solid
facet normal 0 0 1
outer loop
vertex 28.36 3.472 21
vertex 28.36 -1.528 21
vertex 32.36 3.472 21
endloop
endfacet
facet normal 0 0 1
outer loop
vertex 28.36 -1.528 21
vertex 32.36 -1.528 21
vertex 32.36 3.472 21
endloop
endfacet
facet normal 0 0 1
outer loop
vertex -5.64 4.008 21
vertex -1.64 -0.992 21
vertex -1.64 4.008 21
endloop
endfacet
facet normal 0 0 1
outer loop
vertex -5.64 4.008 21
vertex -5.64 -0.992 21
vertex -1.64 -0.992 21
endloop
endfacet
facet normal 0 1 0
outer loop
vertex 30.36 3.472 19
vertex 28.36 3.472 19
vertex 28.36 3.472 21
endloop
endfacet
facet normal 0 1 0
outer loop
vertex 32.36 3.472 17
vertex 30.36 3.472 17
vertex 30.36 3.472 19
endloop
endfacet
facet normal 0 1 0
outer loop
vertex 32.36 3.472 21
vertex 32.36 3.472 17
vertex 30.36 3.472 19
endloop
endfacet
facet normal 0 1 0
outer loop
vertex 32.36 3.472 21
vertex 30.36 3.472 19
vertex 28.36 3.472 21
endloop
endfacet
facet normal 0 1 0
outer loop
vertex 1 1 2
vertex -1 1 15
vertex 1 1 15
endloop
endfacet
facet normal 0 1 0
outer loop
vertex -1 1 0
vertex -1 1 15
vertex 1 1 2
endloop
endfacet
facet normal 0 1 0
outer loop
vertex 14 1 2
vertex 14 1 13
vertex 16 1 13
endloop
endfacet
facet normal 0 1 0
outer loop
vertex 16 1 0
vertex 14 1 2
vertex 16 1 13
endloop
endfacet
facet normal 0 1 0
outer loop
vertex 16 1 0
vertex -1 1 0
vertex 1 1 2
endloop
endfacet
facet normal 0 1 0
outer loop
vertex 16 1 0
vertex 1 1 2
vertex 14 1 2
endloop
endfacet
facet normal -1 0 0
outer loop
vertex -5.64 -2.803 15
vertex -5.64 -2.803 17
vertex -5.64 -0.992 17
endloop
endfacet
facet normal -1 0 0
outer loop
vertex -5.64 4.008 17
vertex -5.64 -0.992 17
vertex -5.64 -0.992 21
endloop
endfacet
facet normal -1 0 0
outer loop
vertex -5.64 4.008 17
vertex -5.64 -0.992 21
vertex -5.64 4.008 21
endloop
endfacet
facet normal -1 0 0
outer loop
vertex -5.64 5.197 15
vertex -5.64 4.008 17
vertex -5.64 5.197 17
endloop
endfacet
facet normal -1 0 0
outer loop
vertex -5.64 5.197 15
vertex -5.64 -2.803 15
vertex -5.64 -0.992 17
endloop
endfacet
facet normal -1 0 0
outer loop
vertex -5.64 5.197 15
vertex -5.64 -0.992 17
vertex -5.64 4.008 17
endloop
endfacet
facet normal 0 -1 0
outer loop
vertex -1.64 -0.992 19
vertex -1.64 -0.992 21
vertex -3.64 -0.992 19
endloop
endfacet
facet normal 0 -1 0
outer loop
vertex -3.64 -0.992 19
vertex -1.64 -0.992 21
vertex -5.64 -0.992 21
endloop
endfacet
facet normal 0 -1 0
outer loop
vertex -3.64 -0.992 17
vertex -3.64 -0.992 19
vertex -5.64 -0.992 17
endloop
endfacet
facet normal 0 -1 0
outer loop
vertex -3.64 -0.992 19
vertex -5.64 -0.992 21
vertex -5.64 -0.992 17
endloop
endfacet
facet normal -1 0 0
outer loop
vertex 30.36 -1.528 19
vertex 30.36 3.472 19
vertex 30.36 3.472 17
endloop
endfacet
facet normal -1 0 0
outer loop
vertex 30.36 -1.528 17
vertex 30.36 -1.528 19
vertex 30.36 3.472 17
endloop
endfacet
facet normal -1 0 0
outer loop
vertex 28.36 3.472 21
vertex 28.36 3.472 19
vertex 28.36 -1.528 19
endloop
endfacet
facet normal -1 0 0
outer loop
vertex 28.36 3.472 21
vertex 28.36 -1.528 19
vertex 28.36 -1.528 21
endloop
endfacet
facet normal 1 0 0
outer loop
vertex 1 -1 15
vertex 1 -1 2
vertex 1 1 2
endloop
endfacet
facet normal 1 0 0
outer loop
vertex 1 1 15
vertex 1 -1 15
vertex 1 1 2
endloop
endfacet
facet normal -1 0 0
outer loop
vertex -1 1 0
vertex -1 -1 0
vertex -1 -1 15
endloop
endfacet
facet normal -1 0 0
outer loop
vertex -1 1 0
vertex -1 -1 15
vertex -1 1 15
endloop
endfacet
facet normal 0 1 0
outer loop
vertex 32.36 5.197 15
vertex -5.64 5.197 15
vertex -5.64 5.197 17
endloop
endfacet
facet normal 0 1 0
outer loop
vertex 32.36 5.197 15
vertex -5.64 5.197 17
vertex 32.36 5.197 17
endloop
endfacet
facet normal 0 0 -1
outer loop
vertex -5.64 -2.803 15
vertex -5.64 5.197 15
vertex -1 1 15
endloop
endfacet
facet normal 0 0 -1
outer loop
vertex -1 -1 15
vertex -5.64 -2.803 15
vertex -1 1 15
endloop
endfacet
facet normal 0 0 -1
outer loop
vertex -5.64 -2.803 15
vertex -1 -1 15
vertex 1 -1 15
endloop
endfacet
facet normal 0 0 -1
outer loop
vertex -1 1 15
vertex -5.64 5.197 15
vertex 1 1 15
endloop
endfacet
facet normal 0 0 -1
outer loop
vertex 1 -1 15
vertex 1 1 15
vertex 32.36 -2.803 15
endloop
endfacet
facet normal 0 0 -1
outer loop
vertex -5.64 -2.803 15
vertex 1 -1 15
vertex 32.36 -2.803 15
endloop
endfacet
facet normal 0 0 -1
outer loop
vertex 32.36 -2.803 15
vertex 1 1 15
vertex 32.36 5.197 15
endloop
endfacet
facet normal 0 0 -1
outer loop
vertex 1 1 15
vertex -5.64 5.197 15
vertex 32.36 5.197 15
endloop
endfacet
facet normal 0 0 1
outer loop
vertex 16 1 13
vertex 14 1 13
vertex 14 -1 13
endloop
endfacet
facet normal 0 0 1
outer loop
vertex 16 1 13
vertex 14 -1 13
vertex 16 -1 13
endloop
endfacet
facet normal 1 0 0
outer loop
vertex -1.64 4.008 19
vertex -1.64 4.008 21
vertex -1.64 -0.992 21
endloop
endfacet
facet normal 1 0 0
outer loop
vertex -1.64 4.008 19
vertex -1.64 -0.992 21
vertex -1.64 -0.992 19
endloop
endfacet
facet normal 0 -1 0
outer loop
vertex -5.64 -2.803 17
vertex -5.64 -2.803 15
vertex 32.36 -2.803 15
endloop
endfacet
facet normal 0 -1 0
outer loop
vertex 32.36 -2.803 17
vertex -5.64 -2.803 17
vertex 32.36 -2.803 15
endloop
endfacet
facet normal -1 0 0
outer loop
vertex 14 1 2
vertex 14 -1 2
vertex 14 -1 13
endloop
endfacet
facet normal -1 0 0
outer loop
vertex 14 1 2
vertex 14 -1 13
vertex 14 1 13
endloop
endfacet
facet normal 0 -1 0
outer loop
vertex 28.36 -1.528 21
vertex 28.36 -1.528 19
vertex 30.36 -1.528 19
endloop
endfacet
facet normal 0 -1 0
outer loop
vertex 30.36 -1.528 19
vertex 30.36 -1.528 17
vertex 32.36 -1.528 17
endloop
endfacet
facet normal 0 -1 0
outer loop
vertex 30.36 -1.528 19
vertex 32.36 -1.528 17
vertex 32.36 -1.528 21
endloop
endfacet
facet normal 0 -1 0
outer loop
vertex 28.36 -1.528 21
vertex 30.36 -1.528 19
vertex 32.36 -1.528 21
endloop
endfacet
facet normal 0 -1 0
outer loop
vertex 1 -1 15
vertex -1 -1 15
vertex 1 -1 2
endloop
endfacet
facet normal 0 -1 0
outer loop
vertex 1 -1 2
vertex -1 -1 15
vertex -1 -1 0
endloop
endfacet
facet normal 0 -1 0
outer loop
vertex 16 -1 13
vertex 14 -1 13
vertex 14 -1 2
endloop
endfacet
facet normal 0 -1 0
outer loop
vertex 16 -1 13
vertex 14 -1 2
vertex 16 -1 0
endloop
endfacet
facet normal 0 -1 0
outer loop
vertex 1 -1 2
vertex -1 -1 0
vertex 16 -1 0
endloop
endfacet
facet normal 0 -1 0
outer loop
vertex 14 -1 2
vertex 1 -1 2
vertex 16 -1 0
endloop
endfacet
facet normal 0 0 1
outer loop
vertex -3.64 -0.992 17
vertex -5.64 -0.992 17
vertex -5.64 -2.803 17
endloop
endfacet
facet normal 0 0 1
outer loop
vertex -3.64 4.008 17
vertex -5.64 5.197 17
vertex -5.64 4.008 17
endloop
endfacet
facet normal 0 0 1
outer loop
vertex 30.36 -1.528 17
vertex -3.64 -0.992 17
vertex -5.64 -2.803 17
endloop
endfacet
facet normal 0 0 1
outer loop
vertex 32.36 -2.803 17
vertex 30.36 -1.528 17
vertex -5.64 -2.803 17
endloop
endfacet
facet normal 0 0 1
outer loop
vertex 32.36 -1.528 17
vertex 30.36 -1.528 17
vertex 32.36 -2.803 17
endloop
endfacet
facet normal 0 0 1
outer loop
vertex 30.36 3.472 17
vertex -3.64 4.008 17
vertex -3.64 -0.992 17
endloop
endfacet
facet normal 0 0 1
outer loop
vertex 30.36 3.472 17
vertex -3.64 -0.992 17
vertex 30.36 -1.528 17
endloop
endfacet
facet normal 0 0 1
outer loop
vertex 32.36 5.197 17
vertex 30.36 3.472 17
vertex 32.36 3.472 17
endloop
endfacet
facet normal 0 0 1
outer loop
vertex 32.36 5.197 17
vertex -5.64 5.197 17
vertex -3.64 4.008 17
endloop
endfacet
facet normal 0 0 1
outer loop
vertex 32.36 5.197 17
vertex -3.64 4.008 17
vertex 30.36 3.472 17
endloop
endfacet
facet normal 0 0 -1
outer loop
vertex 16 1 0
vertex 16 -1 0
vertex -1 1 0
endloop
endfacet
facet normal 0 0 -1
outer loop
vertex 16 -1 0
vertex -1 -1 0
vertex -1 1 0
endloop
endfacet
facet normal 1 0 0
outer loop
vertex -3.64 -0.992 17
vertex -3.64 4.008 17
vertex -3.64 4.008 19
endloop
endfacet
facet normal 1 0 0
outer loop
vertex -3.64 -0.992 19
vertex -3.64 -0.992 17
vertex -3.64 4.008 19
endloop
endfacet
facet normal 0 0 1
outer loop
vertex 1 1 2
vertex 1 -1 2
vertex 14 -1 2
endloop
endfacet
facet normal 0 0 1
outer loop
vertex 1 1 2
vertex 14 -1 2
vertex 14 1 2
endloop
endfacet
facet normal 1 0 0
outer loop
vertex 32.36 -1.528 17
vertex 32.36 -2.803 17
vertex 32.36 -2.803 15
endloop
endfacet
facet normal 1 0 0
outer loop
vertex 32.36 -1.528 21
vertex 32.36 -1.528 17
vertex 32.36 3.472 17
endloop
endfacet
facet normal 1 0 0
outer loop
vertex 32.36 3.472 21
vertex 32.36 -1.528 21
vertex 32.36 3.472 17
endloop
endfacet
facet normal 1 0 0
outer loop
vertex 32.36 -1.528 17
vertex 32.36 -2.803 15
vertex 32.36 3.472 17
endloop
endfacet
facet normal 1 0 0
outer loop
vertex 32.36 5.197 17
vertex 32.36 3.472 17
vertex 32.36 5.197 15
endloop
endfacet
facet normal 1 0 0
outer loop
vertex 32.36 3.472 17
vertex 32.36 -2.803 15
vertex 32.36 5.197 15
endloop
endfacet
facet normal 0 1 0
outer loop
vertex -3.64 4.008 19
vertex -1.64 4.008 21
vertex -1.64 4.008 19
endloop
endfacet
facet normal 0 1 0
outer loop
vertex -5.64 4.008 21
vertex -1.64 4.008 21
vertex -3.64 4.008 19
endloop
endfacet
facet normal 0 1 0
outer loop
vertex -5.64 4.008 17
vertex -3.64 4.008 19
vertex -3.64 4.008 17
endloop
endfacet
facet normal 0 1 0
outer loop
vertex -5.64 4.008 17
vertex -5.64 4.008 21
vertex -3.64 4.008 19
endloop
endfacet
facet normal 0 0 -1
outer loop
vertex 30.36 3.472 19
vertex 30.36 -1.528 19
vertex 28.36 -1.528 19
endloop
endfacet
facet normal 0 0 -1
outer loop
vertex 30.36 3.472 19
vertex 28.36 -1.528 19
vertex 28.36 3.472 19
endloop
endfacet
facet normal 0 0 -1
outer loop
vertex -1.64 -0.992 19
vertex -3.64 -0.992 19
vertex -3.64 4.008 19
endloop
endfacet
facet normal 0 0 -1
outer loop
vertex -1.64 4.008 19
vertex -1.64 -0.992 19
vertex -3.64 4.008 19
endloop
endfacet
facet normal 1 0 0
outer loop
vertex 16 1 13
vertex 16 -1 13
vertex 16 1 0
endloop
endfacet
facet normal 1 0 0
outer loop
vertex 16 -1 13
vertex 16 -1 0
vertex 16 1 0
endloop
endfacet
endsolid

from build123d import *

# Parameters (mm, degrees)
SKETCH1_W           = 2
SKETCH1_H           = 2
BOSS_EXTRUDE1_DEPTH = 15
SKETCH4_W           = 2
SKETCH4_H           = 2
BOSS_EXTRUDE3_DEPTH = 15
SKETCH5_W           = 2
SKETCH5_H           = 2
BOSS_EXTRUDE4_DEPTH = 11
SKETCH6_W           = 38
SKETCH6_H           = 8
BOSS_EXTRUDE5_DEPTH = 2
SKETCH8_W           = 4
SKETCH8_H           = 5
BOSS_EXTRUDE6_DEPTH = 2
SKETCH9_W           = 4
SKETCH9_H           = 5
BOSS_EXTRUDE7_DEPTH = 2
SKETCH10_W          = 2
SKETCH10_H          = 5
BOSS_EXTRUDE8_DEPTH = 2
SKETCH11_W          = 2
SKETCH11_H          = 5
BOSS_EXTRUDE9_DEPTH = 2


with BuildPart() as part:
    # Sketch1 → Boss-Extrude1 (new body)
    with BuildSketch(Plane.XY):
        Rectangle(SKETCH1_W, SKETCH1_H)
    extrude(amount=BOSS_EXTRUDE1_DEPTH)

    # Sketch4 → Boss-Extrude3 (add)
    with BuildSketch(Plane(origin=(1, 0, 0), x_dir=(0, 0, -1), z_dir=(1, 0, 0))):
        with Locations((-1, 0)):
            Rectangle(SKETCH4_W, SKETCH4_H)
    extrude(amount=BOSS_EXTRUDE3_DEPTH)

    # Sketch5 → Boss-Extrude4 (add)
    with BuildSketch(Plane.XY.offset(2)):
        with Locations((15, 0)):
            Rectangle(SKETCH5_W, SKETCH5_H)
    extrude(amount=BOSS_EXTRUDE4_DEPTH)

    # Sketch6 → Boss-Extrude5 (add)
    with BuildSketch(Plane.XY.offset(15)):
        with Locations((13.360084104, 1.19652769)):
            Rectangle(SKETCH6_W, SKETCH6_H)
    extrude(amount=BOSS_EXTRUDE5_DEPTH)

    # Sketch8 → Boss-Extrude6 (add)
    with BuildSketch(Plane(origin=(32.360084104, 0, 0), x_dir=(0, 0, -1), z_dir=(1, 0, 0))):
        with Locations((-19, 0.971825631)):
            Rectangle(SKETCH8_W, SKETCH8_H)
    extrude(amount=-BOSS_EXTRUDE6_DEPTH)

    # Sketch9 → Boss-Extrude7 (add)
    with BuildSketch(Plane.ZY.offset(5.639915896)):
        with Locations((19, 1.508383794)):
            Rectangle(SKETCH9_W, SKETCH9_H)
    extrude(amount=-BOSS_EXTRUDE7_DEPTH)

    # Sketch10 → Boss-Extrude8 (add)
    with BuildSketch(Plane(origin=(-3.639915896, 0, 0), x_dir=(0, 0, -1), z_dir=(1, 0, 0))):
        with Locations((-20, 1.508383794)):
            Rectangle(SKETCH10_W, SKETCH10_H)
    extrude(amount=BOSS_EXTRUDE8_DEPTH)

    # Sketch11 → Boss-Extrude9 (add)
    with BuildSketch(Plane.ZY.offset(-30.360084104)):
        with Locations((20, 0.971825631)):
            Rectangle(SKETCH11_W, SKETCH11_H)
    extrude(amount=BOSS_EXTRUDE9_DEPTH)


solid = part.part
